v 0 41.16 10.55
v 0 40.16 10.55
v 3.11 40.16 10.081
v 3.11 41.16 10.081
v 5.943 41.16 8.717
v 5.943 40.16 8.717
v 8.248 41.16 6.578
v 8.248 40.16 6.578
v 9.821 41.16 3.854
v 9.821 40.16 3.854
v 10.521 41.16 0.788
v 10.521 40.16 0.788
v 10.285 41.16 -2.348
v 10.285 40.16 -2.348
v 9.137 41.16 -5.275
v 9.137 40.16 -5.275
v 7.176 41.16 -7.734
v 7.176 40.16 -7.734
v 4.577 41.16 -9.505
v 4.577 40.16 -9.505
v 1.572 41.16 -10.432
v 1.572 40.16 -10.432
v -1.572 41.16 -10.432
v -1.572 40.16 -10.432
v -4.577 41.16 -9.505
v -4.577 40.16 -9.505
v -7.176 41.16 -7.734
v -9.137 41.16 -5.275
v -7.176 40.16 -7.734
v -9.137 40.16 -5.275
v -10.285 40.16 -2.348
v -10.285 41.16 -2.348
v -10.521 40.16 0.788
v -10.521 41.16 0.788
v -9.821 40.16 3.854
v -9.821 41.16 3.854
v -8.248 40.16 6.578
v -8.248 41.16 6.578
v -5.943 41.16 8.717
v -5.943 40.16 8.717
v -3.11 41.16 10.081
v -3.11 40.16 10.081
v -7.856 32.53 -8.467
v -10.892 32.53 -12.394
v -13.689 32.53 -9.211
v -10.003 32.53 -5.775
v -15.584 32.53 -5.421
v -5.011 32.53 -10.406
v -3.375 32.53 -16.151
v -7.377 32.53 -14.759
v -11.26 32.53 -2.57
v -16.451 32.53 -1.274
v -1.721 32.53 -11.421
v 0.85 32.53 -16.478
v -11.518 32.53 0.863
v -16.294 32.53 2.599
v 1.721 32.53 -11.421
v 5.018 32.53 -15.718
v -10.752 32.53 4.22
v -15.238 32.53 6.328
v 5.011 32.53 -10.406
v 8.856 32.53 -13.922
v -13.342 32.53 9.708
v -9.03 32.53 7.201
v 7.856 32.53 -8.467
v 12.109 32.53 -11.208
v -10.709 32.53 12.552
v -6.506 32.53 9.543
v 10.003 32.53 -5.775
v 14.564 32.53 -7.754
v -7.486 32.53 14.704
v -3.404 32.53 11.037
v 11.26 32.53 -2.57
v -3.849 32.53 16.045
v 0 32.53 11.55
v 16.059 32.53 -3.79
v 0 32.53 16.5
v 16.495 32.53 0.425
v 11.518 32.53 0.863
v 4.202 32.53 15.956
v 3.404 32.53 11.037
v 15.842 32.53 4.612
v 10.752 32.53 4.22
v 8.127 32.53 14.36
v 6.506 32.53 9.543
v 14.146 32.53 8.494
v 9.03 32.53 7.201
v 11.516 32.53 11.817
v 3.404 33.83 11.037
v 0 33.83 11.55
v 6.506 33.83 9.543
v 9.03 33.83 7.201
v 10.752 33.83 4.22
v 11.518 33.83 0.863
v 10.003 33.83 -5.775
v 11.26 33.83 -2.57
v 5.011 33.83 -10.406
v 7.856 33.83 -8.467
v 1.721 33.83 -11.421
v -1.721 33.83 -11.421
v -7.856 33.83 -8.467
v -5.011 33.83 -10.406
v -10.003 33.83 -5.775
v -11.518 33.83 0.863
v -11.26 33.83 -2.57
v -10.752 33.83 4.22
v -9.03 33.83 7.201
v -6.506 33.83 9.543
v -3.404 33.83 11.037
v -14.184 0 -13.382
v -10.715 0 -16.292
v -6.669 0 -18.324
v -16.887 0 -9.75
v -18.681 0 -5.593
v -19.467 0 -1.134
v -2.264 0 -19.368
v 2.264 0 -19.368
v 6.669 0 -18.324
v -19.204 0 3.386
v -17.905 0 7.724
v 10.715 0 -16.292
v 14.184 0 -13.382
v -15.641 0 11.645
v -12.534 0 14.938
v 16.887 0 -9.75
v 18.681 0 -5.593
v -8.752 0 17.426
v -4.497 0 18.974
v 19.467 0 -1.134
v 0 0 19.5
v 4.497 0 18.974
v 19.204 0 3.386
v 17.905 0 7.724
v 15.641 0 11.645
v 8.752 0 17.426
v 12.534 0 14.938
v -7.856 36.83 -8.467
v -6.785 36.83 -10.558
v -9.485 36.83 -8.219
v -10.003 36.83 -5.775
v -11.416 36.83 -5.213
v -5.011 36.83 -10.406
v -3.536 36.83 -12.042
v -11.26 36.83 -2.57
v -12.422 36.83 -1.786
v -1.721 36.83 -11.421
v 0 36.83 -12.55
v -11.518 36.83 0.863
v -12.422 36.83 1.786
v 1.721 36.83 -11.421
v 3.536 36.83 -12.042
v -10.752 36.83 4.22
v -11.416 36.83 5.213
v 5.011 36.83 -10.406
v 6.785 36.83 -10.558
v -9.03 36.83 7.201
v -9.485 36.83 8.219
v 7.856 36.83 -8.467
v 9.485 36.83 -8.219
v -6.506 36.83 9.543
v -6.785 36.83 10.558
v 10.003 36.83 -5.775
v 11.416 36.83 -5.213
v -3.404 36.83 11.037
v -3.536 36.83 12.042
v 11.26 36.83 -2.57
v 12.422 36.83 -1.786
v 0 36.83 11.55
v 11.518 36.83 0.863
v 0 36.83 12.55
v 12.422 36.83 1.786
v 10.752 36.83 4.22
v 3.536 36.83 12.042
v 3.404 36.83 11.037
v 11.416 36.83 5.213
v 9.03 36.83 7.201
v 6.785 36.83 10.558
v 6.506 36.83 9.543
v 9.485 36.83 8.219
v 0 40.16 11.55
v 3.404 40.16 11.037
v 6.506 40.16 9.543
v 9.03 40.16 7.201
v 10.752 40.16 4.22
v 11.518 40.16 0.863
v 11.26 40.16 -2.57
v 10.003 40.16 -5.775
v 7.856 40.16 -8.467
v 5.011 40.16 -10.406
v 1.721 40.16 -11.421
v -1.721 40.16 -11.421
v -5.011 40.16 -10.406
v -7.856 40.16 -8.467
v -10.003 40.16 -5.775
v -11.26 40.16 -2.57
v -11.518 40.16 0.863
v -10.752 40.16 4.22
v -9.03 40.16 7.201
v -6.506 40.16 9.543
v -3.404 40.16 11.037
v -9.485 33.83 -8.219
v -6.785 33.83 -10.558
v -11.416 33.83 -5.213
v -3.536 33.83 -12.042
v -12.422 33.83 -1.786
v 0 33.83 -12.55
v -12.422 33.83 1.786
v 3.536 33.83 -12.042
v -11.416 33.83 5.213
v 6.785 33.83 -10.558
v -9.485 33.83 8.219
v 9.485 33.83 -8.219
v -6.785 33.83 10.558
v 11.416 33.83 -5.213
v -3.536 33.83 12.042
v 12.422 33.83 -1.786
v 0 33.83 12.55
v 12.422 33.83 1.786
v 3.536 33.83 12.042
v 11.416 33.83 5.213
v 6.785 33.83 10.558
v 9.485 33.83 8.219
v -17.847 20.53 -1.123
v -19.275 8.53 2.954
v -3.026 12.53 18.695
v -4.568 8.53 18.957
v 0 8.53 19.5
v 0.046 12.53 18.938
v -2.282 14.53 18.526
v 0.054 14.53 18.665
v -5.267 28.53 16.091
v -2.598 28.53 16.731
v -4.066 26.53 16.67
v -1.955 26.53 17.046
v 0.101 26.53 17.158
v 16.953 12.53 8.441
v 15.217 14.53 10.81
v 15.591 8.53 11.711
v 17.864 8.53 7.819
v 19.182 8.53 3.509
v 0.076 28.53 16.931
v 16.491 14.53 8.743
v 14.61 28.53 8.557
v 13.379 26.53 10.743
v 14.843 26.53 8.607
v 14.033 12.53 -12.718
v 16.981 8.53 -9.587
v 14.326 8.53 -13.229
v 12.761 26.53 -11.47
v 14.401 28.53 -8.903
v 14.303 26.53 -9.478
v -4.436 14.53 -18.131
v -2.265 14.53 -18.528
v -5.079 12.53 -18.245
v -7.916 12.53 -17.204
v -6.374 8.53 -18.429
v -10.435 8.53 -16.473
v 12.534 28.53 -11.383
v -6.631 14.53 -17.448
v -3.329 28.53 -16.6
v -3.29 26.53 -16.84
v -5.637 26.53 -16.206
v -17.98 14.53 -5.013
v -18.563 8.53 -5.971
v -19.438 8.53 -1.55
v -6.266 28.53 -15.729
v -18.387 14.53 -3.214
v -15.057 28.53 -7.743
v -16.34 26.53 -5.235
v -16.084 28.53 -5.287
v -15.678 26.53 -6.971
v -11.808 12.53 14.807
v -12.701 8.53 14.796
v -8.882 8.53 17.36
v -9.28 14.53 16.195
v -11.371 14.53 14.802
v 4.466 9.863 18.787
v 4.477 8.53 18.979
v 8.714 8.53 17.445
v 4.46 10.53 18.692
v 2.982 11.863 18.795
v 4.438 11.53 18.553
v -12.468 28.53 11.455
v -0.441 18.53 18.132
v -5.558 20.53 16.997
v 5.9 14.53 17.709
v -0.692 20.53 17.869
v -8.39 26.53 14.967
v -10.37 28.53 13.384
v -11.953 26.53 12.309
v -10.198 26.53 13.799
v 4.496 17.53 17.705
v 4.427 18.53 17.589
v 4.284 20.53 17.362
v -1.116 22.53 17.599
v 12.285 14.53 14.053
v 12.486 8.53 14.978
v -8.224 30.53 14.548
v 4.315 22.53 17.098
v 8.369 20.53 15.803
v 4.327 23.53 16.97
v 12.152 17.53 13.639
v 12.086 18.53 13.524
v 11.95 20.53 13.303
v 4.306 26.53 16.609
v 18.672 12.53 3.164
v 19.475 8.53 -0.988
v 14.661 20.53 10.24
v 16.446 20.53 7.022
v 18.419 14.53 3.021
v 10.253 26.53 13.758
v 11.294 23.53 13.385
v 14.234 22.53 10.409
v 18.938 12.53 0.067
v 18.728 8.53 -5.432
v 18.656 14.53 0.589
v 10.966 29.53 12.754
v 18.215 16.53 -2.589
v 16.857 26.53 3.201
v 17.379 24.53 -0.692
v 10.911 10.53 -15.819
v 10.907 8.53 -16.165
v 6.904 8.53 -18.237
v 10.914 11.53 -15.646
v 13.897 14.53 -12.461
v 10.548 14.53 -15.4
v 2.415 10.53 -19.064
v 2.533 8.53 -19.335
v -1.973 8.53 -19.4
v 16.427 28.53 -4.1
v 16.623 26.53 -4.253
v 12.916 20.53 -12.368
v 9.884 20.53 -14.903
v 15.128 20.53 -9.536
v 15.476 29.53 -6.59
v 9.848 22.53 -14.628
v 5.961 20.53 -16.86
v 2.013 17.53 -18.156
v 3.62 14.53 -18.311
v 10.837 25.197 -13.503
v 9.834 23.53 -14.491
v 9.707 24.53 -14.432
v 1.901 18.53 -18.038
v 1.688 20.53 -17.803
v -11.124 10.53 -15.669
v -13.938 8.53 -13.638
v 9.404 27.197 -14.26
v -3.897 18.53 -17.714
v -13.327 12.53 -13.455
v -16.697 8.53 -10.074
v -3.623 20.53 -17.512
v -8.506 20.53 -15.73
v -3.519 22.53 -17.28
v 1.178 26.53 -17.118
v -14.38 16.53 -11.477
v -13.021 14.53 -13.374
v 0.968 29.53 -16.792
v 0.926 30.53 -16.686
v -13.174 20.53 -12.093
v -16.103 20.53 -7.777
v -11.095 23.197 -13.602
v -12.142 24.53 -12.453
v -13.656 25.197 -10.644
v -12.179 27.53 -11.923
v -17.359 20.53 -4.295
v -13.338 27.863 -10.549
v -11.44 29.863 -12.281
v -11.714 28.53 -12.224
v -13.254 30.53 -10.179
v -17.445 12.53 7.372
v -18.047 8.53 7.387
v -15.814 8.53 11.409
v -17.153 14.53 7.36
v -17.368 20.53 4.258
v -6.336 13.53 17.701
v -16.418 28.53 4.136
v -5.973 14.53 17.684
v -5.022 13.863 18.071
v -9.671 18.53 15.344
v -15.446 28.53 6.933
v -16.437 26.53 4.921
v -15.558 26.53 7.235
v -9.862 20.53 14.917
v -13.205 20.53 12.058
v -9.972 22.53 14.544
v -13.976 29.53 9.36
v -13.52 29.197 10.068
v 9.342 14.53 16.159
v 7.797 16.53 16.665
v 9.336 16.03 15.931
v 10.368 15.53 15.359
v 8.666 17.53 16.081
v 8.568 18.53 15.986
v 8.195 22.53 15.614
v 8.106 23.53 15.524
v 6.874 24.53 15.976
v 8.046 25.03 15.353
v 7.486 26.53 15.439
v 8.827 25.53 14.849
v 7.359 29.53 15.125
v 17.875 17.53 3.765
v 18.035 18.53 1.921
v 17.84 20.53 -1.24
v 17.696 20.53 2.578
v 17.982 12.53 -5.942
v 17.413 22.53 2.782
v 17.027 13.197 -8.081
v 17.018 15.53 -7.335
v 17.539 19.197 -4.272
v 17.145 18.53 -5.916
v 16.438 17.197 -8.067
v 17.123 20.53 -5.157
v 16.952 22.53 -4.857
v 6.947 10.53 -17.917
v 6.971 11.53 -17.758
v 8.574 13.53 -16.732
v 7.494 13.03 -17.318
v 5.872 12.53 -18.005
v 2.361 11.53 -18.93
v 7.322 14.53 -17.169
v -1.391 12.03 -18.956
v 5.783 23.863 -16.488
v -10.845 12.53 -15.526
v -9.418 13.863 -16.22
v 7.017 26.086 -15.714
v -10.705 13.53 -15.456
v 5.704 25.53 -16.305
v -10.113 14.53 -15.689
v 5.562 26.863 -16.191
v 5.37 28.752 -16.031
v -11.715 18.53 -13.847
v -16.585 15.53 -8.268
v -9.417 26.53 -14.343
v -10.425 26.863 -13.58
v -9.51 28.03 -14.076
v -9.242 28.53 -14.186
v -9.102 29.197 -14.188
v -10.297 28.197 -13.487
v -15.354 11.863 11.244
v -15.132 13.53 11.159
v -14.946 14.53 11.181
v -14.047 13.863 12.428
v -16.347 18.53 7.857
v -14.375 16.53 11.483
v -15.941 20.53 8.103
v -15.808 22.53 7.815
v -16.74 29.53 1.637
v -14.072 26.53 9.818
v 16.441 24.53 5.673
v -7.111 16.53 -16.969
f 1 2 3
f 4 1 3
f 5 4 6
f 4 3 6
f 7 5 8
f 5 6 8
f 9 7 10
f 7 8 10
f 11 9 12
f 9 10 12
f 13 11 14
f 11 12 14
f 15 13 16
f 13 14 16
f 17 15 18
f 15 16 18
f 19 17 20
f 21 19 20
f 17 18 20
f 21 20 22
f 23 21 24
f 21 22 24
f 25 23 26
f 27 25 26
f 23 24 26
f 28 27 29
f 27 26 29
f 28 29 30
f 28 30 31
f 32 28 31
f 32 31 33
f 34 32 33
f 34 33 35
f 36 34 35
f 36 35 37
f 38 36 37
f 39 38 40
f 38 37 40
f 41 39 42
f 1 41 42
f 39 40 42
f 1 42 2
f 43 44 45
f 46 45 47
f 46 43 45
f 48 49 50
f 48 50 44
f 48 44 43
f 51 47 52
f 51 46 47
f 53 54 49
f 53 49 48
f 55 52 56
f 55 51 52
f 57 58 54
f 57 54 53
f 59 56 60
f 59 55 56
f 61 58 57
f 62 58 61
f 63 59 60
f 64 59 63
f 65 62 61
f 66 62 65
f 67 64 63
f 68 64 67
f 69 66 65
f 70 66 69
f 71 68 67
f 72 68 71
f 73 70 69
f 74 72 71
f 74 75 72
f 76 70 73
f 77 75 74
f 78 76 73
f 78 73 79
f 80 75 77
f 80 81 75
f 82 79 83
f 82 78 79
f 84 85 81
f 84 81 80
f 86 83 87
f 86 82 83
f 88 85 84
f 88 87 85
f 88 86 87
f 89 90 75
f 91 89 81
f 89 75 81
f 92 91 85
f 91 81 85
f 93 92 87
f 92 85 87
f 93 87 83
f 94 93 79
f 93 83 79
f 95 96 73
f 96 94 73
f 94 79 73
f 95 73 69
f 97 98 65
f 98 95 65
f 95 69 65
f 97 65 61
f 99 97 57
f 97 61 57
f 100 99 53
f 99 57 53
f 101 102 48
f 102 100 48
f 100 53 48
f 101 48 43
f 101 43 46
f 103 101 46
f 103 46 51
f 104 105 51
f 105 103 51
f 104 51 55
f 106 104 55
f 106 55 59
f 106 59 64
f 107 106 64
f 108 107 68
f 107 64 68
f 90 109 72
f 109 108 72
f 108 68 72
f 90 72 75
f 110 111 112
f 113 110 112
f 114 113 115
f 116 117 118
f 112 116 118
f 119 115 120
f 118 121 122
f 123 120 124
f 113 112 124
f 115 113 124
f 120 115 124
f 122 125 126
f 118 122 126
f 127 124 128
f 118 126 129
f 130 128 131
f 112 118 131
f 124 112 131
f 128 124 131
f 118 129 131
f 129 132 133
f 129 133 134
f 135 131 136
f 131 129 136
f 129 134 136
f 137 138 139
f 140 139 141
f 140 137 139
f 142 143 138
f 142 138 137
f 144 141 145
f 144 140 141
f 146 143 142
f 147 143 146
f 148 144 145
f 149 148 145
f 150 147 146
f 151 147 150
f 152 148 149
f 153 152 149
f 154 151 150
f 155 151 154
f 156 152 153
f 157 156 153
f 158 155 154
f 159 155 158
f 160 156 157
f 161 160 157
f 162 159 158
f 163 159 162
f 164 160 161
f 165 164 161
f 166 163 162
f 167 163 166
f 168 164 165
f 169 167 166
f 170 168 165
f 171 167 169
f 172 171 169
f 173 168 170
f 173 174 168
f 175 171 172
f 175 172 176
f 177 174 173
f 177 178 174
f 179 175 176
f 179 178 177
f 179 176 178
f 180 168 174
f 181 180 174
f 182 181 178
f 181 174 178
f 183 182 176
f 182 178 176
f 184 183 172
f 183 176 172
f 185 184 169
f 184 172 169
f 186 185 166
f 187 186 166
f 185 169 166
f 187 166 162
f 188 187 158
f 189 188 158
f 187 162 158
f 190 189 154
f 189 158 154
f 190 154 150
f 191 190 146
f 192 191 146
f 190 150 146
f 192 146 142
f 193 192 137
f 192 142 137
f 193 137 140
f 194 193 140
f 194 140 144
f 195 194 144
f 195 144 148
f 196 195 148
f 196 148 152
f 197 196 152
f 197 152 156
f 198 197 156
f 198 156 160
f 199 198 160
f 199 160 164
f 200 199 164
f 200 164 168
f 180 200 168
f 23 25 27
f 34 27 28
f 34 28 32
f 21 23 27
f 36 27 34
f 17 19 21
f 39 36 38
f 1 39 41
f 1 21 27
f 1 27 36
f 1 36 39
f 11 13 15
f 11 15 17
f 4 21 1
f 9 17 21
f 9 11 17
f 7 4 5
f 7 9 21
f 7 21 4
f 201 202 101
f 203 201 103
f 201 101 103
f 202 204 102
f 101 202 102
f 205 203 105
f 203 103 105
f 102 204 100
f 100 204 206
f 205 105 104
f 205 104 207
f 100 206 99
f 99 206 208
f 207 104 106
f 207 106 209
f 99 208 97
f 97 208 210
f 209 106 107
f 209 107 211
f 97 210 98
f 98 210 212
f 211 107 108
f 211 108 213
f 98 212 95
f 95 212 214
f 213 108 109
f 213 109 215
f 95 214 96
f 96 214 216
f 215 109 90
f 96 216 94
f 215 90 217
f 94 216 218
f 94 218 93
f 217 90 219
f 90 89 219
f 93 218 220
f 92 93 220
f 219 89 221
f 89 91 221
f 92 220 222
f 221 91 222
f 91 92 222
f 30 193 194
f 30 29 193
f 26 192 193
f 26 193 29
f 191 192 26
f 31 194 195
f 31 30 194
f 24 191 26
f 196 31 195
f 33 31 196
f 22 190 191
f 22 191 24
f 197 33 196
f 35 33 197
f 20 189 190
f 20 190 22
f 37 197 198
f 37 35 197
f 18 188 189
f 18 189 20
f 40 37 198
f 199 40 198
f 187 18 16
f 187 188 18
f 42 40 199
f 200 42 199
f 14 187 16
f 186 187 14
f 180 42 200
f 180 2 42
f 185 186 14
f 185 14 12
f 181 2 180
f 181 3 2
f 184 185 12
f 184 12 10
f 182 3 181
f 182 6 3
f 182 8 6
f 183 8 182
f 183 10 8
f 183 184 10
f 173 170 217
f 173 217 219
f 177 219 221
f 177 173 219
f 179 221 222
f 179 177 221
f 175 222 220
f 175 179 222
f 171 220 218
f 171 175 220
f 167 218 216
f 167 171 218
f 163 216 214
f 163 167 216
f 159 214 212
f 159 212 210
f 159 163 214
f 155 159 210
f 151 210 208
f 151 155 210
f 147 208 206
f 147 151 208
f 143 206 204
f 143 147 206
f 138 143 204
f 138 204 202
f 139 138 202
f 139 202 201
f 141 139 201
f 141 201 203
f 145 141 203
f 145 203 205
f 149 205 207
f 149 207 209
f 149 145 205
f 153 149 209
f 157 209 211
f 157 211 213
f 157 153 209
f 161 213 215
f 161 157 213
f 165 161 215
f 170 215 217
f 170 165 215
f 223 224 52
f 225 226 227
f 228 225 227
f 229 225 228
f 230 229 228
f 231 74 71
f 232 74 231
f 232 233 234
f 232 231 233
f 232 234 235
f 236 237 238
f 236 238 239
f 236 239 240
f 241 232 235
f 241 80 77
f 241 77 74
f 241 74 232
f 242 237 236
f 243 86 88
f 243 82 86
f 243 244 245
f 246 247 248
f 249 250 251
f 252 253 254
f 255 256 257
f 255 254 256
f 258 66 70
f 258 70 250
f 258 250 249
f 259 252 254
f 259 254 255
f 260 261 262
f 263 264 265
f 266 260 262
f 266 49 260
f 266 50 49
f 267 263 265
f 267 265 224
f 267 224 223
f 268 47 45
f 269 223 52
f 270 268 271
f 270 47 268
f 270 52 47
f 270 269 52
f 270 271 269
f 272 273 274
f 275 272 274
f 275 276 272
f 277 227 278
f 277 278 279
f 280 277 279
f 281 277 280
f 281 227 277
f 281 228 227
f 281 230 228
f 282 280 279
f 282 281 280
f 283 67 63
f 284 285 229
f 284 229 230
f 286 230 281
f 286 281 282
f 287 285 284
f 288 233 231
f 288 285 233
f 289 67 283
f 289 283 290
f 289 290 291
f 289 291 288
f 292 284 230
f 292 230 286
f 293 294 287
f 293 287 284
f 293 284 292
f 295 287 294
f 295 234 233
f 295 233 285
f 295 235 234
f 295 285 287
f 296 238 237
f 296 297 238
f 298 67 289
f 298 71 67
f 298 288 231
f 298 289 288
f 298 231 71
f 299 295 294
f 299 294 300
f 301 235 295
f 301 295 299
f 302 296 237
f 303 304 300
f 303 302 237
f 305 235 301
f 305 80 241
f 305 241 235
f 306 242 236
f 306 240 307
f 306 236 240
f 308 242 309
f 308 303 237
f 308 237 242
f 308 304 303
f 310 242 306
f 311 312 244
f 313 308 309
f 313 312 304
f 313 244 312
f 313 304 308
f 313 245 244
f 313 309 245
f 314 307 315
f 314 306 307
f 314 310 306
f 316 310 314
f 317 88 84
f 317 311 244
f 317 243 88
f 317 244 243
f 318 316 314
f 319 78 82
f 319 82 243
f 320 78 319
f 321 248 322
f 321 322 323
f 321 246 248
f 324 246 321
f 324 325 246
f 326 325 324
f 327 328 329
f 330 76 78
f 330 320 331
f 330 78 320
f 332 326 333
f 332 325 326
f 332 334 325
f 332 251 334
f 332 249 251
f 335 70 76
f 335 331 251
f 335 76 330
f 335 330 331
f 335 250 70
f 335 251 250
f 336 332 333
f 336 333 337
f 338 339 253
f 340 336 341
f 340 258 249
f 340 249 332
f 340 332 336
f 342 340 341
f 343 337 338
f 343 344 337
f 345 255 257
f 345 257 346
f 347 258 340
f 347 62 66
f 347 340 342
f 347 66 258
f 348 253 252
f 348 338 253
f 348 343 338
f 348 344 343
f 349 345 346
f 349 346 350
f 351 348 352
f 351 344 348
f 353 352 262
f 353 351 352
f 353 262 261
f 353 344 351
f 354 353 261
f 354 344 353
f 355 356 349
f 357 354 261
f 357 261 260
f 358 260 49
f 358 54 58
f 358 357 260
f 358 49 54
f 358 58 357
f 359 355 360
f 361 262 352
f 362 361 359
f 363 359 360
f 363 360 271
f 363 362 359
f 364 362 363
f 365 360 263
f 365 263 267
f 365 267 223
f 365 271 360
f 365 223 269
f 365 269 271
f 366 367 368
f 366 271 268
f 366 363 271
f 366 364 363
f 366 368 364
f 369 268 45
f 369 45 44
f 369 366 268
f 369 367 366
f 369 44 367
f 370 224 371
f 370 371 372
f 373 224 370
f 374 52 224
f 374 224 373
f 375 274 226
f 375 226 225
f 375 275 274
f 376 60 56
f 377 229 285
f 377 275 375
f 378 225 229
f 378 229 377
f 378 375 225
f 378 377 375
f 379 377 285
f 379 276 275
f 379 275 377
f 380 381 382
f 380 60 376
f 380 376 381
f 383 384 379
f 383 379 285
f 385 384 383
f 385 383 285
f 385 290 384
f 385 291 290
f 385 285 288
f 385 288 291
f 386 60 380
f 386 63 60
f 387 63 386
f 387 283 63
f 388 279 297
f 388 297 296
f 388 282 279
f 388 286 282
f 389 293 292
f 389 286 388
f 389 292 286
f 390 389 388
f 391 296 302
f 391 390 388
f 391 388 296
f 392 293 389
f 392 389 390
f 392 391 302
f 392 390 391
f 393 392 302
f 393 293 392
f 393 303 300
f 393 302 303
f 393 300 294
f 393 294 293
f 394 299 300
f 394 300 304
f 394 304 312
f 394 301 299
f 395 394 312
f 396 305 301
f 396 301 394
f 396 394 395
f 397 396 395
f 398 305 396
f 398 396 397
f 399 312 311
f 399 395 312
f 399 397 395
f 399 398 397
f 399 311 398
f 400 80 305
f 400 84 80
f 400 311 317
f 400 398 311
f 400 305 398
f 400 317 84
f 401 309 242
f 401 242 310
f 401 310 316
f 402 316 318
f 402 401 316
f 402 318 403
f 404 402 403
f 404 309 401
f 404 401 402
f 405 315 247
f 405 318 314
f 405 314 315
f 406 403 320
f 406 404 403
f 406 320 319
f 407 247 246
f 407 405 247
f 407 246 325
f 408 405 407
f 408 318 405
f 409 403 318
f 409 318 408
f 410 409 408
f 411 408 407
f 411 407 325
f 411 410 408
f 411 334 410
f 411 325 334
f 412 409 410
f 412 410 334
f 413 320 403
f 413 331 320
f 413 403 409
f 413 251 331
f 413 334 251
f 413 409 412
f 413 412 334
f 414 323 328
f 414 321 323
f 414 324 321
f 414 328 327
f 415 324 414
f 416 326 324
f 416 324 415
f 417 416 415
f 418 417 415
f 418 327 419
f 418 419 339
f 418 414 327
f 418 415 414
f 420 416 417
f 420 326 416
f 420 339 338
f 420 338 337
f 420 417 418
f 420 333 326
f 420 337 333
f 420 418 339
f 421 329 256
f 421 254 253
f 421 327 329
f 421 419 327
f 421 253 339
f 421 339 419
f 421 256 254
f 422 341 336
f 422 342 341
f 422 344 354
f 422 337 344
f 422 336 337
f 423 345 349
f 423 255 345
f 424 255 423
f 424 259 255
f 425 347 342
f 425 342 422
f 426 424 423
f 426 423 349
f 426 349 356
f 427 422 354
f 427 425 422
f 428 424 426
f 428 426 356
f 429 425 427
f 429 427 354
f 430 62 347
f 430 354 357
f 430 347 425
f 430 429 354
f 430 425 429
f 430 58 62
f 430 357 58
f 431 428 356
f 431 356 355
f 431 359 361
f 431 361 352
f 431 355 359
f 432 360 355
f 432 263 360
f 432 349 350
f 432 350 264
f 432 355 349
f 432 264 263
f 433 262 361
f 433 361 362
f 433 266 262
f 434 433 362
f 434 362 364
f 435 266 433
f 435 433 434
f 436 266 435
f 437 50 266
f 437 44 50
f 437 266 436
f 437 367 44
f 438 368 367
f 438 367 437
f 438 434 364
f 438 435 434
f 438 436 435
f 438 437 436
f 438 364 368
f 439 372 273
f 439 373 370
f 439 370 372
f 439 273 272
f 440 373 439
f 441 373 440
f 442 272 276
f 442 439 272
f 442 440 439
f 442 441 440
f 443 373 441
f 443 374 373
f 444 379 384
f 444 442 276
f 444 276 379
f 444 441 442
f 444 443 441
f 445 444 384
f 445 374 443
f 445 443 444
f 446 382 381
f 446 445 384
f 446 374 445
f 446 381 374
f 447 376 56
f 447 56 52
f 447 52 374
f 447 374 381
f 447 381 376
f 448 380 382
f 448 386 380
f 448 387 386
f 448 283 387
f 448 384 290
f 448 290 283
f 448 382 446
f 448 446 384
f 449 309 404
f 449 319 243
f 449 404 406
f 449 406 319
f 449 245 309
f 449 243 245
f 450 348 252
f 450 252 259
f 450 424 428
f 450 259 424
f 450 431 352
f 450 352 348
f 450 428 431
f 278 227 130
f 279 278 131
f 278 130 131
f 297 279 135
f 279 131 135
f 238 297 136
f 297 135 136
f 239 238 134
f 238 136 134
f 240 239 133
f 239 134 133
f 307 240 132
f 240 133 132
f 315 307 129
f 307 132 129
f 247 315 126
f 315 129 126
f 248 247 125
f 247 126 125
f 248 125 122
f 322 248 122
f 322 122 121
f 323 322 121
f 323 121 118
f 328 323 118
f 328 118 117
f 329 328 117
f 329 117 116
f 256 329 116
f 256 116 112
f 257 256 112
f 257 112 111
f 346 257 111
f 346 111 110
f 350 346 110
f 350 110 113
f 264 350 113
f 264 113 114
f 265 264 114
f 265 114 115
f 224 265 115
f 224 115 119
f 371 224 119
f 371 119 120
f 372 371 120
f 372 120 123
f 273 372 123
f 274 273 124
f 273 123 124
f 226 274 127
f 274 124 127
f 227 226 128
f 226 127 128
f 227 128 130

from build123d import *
from build123d.topology import SkipClean

# Parameters (mm, degrees)
SKETCH1_R           = 19.5
BOSS_EXTRUDE1_DEPTH = 32.53
SKETCH2_R           = 11.55
BOSS_EXTRUDE2_DEPTH = 8.63
BOSS_EXTRUDE3_START = -4.33
SKETCH3_R           = 12.55
BOSS_EXTRUDE3_DEPTH = 3
CUT_EXTRUDE1_START  = -1
SKETCH4_R           = 11.55
SKETCH4_R_2         = 10.55
CUT_EXTRUDE1_DEPTH  = 1
CUT_EXTRUDE3_START  = -24
SKETCH5_R           = 19.5
SKETCH5_R_2         = 16.5
CUT_EXTRUDE3_DEPTH  = 24


with BuildPart() as part:
    # Sketch1 → Boss-Extrude1 (new body)
    with BuildSketch(Plane(origin=(0, 0, 0), x_dir=(1, 0, 0), z_dir=(0, 1, 0))):
        with Locations(Location((0, 0, 0), (0, 0, 270))):
            Circle(SKETCH1_R)
    extrude(amount=BOSS_EXTRUDE1_DEPTH)

    # Sketch2 → Boss-Extrude2 (add)
    with BuildSketch(Plane(origin=(0, 32.53, 0), x_dir=(1, 0, 0), z_dir=(0, 1, 0))):
        with Locations(Location((0, 0, 0), (0, 0, 270))):
            Circle(SKETCH2_R)
    extrude(amount=BOSS_EXTRUDE2_DEPTH)

    # Sketch3 → Boss-Extrude3 (add)
    with BuildSketch(Plane(origin=(0, 41.16, 0), x_dir=(1, 0, 0), z_dir=(0, 1, 0)).offset(BOSS_EXTRUDE3_START)):
        with Locations(Location((0, 0, 0), (0, 0, 270))):
            Circle(SKETCH3_R)
    extrude(amount=-BOSS_EXTRUDE3_DEPTH)

    # Sketch4 → Cut-Extrude1 (cut)
    with BuildSketch(Plane(origin=(0, 41.16, 0), x_dir=(1, 0, 0), z_dir=(0, 1, 0)).offset(CUT_EXTRUDE1_START)):
        with Locations(Location((0, 0, 0), (0, 0, 270))):
            Circle(SKETCH4_R)
        with Locations(Location((0, 0, 0), (0, 0, 270))):
            Circle(SKETCH4_R_2, mode=Mode.SUBTRACT)
    extrude(amount=CUT_EXTRUDE1_DEPTH, mode=Mode.SUBTRACT)

    # Sketch5 → Cut-Extrude3 (cut)
    with BuildSketch(Plane(origin=(0, 32.53, 0), x_dir=(1, 0, 0), z_dir=(0, 1, 0)).offset(CUT_EXTRUDE3_START)):
        with Locations(Location((0, 0, 0), (0, 0, 270))):
            Circle(SKETCH5_R)
        with Locations(Location((0, 0, 0), (0, 0, 270))):
            Circle(SKETCH5_R_2, mode=Mode.SUBTRACT)
    extrude(amount=CUT_EXTRUDE3_DEPTH, mode=Mode.SUBTRACT)

    # Loft1: read off the stored shape, not the designer's step
    # Loft1: loft between two sections, ruled curve by curve
    with SkipClean():  # the faces are left unmerged after this step: merging them gives an invalid solid
        loft1_from = [
            Edge.make_bspline([(-19.27501261, 8.53, 2.953623009), (-13.367766593, 8.53, 41.503648229), (25.182258628, 8.53, 35.596402212), (19.27501261, 8.53, -2.953623009), (13.367766593, 8.53, -41.503648229), (-25.182258628, 8.53, -35.596402212), (-19.27501261, 8.53, 2.953623009)], [0, 0, 0, 0, 0.5, 0.5, 0.5, 1, 1, 1, 1], 3, [1, 0.333333333, 0.333333333, 1, 0.333333333, 0.333333333, 1]),
        ]
        loft1_to = [
            Edge.make_bspline([(-16.450749829, 32.53, -1.273903469), (-18.998556767, 32.53, 31.62759619), (13.902942892, 32.53, 34.175403128), (16.450749829, 32.53, 1.273903469), (18.998556767, 32.53, -31.62759619), (-13.902942892, 32.53, -34.175403128), (-16.450749829, 32.53, -1.273903469)], [0, 0, 0, 0, 0.5, 0.5, 0.5, 1, 1, 1, 1], 3, [1, 0.333333333, 0.333333333, 1, 0.333333333, 0.333333333, 1]),
        ]
        loft1 = Solid(Shell([*[Face.make_surface_from_curves(loft1_from[k], loft1_to[k]) for k in range(1)], Face(Wire(loft1_from)), Face(Wire(loft1_to))]))
        add(loft1)


solid = part.part
